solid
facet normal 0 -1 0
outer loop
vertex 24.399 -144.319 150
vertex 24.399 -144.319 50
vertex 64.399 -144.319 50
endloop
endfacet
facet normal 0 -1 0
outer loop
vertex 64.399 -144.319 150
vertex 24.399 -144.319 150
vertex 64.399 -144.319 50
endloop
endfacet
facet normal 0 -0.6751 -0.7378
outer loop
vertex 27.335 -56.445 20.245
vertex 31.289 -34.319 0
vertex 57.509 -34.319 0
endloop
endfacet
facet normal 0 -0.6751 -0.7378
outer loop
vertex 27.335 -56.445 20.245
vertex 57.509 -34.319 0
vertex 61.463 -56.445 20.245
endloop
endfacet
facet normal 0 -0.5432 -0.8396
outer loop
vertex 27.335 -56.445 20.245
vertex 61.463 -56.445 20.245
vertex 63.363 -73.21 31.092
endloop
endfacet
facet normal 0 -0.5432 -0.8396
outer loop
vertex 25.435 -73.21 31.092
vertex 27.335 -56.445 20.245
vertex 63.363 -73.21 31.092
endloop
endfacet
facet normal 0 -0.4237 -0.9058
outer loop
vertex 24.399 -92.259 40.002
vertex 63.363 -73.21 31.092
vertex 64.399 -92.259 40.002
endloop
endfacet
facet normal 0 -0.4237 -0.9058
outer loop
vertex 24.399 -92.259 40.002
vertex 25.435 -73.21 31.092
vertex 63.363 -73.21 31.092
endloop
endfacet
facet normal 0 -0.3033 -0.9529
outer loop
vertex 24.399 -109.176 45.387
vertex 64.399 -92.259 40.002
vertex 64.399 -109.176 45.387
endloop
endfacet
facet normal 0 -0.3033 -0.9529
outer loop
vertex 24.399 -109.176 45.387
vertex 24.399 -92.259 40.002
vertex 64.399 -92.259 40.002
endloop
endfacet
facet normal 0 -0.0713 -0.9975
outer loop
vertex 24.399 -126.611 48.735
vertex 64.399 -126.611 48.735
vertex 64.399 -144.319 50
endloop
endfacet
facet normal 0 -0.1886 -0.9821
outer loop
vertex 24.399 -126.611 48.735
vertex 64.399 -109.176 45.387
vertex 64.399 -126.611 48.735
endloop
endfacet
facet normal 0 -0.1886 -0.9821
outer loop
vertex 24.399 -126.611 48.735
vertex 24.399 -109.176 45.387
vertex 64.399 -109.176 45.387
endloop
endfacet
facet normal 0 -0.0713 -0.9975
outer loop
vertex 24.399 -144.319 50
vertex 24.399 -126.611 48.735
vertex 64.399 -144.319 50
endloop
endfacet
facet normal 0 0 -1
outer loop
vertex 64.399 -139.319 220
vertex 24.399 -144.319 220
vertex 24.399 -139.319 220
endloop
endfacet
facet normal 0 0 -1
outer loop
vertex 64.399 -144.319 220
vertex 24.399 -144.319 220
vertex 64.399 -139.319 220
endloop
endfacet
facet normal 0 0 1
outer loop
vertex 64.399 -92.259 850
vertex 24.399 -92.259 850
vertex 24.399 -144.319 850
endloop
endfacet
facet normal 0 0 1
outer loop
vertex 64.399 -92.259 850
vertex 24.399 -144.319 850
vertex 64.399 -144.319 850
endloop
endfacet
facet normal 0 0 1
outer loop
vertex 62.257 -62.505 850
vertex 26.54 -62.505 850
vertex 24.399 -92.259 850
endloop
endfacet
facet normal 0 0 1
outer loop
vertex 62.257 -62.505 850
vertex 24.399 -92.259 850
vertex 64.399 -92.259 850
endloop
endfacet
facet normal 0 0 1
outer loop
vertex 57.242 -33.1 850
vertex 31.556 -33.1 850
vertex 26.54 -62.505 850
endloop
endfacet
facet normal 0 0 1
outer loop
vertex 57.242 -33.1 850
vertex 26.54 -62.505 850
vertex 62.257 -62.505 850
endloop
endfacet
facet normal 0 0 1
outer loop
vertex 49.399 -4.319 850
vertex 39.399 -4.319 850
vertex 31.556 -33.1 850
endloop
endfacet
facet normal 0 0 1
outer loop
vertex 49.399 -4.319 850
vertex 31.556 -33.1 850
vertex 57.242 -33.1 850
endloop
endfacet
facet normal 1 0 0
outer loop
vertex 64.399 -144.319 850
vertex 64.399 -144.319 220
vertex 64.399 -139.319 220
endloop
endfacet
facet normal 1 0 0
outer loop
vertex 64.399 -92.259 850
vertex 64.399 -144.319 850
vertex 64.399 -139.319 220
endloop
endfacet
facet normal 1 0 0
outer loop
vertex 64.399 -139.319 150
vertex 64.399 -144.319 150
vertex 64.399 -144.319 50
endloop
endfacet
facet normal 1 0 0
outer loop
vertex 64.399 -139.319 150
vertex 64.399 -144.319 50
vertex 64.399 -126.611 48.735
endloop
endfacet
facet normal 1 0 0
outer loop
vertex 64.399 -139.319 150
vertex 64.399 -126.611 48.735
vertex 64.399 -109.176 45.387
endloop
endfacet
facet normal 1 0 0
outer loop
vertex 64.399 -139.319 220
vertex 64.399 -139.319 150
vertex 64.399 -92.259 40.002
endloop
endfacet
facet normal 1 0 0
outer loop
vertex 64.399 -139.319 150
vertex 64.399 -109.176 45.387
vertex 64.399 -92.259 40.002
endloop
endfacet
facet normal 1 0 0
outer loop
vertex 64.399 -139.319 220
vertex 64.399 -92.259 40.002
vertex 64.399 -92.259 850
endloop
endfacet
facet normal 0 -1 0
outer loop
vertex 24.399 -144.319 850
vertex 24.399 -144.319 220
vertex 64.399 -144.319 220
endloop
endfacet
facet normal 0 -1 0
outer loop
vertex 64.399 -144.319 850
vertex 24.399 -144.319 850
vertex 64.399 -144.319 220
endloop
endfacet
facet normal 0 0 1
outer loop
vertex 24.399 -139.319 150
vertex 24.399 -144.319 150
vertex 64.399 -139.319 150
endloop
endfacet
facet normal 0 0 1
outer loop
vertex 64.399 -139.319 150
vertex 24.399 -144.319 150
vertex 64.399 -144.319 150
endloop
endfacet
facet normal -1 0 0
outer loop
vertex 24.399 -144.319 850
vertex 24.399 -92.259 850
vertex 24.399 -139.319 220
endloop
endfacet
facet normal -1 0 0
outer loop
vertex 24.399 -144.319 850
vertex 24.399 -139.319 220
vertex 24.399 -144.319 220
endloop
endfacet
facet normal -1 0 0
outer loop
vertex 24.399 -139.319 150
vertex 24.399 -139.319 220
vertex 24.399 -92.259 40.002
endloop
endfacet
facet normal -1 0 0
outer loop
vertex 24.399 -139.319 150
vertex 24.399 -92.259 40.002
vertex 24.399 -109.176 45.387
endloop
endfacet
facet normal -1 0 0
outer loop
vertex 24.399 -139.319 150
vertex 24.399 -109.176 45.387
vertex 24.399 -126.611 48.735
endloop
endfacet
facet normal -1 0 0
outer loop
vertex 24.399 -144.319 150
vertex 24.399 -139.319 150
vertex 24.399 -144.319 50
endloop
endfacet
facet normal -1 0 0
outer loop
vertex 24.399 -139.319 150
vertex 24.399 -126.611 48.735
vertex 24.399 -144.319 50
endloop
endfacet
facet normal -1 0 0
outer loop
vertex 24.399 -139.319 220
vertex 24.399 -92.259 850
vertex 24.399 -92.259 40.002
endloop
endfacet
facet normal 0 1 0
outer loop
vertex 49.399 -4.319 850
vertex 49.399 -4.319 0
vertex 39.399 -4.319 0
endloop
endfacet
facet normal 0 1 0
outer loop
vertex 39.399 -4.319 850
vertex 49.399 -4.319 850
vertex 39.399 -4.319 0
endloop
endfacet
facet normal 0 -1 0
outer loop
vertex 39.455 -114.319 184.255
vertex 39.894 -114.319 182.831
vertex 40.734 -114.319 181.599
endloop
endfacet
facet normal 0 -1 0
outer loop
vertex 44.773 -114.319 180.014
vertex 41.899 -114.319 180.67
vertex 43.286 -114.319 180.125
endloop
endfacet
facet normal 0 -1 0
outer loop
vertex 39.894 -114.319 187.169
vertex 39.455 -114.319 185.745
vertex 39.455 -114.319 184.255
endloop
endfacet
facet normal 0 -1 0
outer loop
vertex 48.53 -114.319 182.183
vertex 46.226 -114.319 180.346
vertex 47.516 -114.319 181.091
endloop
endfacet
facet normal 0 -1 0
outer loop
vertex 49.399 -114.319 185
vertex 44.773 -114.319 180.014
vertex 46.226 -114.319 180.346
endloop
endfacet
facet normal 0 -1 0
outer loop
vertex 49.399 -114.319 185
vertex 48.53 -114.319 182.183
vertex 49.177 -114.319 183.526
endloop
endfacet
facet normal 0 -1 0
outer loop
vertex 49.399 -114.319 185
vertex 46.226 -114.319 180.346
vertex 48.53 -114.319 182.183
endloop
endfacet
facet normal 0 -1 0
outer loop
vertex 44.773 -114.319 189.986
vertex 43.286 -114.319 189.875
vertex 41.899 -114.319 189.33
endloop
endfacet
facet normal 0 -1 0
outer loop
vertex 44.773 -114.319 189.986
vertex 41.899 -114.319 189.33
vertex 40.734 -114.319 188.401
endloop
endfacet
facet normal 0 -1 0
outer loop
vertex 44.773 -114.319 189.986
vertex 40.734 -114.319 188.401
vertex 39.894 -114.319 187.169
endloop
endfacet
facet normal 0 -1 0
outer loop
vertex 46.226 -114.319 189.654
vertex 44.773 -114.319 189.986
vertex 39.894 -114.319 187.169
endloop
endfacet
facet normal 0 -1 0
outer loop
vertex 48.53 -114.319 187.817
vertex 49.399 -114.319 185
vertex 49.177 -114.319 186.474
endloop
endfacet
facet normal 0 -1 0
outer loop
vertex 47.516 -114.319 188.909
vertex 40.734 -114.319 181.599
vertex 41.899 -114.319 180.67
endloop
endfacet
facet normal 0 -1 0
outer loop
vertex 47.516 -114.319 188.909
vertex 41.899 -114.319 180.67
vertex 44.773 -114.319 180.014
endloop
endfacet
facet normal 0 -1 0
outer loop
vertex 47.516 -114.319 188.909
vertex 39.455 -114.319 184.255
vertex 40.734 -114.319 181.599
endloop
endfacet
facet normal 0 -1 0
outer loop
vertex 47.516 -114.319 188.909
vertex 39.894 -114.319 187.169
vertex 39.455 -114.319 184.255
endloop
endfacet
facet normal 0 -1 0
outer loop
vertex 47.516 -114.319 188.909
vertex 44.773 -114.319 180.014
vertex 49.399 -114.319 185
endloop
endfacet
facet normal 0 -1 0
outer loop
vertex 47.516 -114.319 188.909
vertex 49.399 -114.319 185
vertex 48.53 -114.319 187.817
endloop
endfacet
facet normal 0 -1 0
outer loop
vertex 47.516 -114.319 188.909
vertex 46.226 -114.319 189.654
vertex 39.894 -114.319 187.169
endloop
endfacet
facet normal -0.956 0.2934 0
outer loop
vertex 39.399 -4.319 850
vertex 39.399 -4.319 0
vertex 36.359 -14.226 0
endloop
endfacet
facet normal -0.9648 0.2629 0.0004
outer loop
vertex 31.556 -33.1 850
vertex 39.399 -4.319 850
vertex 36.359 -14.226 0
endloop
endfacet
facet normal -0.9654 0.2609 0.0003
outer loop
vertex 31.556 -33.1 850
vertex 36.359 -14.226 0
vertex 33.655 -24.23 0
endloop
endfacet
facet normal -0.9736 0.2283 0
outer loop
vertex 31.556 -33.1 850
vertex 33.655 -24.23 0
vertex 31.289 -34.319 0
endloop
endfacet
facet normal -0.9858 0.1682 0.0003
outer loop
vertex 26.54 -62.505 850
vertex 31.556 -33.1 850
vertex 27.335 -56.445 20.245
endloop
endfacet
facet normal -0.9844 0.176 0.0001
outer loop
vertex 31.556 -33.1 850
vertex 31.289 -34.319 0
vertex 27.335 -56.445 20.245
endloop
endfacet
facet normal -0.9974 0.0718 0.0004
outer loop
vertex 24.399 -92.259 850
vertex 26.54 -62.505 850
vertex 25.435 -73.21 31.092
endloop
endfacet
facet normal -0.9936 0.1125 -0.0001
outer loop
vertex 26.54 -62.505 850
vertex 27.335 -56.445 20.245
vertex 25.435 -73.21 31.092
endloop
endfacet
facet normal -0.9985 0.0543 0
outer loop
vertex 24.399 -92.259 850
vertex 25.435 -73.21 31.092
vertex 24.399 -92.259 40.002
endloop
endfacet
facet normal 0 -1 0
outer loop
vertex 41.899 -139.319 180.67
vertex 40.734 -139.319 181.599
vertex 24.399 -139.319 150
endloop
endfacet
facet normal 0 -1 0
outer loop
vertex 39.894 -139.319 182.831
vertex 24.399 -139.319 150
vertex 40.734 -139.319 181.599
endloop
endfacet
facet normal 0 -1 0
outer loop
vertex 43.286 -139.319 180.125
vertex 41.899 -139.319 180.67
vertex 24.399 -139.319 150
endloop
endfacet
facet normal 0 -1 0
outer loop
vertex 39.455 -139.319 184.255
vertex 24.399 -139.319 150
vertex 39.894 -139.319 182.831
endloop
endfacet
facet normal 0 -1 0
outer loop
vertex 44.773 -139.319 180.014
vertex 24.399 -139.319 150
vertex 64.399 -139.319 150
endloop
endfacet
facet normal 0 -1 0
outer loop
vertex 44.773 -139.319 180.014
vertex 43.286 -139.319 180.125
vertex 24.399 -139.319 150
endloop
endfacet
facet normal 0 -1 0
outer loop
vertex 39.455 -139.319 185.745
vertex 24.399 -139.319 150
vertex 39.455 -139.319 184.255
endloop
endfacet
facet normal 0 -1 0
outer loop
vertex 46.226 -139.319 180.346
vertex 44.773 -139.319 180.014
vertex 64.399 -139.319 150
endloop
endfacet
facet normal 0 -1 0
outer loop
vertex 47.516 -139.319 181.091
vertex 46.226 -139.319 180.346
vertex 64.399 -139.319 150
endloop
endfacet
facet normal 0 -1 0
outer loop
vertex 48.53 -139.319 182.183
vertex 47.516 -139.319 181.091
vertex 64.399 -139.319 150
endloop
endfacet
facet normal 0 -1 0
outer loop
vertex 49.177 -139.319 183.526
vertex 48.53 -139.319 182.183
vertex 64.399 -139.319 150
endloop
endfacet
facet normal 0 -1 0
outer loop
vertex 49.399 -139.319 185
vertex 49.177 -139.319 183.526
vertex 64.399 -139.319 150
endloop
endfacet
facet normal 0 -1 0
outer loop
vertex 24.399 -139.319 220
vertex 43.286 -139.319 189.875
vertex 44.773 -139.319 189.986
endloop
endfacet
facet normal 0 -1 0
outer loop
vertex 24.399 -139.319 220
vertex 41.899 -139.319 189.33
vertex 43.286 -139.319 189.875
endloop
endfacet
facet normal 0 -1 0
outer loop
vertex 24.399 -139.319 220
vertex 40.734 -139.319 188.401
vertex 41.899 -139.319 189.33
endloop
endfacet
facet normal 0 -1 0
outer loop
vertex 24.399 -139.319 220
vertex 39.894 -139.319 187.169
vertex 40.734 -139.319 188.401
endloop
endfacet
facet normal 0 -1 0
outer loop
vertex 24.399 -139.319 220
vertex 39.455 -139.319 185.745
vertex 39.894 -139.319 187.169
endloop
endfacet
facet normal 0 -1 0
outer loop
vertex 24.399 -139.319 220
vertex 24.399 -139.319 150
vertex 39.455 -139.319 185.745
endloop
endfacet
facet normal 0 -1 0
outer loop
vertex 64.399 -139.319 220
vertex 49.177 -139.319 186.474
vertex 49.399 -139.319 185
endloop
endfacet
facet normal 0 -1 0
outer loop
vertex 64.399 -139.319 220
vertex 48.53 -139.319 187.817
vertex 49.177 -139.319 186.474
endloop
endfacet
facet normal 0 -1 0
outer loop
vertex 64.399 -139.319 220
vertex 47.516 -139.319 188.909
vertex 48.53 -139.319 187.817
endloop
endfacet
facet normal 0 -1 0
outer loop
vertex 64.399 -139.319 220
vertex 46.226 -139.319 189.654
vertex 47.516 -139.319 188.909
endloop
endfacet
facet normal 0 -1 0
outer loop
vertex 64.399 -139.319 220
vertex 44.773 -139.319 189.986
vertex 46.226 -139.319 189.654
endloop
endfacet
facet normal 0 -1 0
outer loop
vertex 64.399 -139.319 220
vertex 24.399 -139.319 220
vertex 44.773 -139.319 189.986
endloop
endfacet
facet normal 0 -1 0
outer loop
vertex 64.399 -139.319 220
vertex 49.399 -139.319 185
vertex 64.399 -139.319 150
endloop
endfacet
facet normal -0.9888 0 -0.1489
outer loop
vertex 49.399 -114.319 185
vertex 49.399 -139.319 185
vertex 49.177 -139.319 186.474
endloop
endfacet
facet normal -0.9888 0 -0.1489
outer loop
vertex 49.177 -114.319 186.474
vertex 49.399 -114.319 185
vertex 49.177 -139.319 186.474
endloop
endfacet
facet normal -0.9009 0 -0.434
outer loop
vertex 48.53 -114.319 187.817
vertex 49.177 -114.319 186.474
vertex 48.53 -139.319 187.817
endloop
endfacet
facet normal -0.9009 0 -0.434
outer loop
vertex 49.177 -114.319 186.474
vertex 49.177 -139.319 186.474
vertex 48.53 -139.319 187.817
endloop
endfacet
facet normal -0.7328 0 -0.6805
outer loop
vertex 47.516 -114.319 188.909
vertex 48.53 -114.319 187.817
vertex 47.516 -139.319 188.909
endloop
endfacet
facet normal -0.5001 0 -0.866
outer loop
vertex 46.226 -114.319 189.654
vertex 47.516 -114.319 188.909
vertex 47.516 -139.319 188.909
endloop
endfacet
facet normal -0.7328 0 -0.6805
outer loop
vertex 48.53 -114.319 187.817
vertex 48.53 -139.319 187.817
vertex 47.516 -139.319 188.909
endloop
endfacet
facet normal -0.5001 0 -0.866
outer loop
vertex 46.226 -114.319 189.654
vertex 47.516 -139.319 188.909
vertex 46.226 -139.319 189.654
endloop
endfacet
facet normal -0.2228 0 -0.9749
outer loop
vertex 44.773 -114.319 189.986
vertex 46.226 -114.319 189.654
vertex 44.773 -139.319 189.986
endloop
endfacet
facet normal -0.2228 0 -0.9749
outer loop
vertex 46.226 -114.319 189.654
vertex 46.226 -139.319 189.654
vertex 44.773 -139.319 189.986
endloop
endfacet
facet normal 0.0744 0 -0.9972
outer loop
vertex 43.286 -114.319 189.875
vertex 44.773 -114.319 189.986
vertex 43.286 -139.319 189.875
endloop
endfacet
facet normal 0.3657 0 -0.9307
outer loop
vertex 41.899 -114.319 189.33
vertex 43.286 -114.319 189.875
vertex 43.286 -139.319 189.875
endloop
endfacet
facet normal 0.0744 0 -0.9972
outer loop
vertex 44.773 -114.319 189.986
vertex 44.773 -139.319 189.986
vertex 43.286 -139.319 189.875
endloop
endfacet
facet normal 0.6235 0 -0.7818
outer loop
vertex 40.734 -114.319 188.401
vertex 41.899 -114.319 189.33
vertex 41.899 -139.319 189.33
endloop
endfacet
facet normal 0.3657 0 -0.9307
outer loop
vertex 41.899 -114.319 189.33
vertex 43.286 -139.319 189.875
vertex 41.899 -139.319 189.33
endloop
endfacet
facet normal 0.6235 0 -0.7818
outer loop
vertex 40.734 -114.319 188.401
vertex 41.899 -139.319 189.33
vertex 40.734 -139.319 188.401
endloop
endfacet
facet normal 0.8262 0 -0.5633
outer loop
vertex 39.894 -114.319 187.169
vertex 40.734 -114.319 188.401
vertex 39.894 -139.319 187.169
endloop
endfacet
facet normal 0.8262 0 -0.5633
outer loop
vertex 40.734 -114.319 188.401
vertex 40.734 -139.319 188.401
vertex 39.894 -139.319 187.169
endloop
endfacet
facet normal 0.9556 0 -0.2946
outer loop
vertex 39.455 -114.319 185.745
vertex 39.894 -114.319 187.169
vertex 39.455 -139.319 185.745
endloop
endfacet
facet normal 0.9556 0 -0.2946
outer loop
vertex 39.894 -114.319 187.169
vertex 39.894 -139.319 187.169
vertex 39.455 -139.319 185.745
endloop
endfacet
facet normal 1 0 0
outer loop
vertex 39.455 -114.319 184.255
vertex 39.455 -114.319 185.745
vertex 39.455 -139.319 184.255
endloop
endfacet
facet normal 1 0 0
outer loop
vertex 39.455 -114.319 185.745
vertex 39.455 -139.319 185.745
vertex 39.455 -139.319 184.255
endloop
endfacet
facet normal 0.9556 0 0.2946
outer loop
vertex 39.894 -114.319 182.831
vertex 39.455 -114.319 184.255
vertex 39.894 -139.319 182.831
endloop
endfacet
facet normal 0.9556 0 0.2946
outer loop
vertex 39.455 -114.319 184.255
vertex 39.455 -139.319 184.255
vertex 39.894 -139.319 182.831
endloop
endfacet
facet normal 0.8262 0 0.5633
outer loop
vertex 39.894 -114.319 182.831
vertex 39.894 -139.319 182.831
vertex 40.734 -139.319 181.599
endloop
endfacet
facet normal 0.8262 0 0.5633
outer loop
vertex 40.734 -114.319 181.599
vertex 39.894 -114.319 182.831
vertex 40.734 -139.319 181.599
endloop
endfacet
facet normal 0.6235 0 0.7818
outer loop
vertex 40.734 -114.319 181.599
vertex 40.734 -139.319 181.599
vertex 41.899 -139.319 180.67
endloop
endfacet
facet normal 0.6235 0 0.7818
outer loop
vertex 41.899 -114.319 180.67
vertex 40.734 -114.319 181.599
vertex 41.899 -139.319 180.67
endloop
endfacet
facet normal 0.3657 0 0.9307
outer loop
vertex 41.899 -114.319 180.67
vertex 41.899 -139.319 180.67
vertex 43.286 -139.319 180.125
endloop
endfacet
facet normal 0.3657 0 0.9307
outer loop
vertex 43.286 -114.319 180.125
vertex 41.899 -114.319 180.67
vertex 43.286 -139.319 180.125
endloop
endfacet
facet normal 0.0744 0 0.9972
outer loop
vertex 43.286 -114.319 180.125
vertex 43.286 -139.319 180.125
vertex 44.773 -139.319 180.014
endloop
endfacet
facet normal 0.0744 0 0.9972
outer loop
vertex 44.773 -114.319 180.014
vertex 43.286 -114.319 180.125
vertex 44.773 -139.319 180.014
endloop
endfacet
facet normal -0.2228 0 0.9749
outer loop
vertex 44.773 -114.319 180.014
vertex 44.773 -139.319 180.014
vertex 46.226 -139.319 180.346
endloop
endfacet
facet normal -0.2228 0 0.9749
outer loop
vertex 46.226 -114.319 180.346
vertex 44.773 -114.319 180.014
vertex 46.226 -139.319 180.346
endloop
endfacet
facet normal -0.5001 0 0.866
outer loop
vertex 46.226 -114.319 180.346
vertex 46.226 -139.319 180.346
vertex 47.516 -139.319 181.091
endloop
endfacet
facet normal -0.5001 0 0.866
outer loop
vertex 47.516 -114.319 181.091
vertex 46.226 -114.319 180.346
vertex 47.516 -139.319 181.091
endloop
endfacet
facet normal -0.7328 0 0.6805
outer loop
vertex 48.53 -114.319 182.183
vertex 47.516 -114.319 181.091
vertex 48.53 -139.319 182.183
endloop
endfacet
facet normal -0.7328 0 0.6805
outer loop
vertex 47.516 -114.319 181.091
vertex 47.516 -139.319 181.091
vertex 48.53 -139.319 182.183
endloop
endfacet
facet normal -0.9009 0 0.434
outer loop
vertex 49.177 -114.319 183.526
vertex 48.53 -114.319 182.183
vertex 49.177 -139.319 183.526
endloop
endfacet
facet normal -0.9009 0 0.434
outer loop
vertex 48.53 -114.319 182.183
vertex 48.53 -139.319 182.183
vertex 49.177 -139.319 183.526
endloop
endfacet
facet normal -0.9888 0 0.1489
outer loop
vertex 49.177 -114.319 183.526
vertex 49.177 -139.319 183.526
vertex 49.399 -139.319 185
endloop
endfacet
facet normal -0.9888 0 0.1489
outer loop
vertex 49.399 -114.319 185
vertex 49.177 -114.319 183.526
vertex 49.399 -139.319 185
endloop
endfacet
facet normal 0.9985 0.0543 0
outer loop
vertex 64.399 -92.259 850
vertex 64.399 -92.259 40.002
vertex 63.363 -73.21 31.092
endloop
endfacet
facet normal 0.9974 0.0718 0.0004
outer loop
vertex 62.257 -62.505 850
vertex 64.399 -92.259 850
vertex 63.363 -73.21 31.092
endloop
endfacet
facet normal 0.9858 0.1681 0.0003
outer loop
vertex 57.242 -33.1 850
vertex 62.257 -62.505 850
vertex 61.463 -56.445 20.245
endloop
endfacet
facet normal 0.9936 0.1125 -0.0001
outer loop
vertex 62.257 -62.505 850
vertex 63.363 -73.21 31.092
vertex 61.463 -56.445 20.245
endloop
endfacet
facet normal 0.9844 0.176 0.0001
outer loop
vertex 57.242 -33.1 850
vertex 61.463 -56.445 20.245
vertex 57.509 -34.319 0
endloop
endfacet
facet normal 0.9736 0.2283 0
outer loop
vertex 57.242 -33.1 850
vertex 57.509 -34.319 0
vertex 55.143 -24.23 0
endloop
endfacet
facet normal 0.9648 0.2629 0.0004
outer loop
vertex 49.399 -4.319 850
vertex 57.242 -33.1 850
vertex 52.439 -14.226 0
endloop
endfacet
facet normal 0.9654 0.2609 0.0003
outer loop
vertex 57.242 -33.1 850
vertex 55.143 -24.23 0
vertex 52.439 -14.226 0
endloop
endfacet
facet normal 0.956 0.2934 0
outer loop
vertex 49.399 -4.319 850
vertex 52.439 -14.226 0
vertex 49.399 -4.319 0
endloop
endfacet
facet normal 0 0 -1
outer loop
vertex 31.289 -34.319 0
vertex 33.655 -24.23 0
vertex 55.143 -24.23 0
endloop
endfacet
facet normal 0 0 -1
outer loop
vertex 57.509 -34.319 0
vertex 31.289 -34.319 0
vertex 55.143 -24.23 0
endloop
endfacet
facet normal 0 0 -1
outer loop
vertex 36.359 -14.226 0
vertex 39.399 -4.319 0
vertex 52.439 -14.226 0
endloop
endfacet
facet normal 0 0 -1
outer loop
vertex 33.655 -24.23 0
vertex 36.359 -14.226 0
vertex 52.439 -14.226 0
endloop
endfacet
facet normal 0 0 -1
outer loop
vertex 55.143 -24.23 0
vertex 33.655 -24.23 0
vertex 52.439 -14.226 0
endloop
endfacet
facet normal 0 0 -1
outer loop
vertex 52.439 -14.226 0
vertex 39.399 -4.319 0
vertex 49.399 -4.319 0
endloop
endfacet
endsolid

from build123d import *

# Parameters (mm, degrees)
F1_DEPTH = 850
F2_W     = 40
F2_H     = 70
F3_DEPTH = 5
F4_R     = 5
F5_DEPTH = 25
F7_DEPTH = 150


with BuildPart() as f1:
    # F0 (on Top) → F1 (new body)
    with BuildSketch(Plane.XY):
        with BuildLine():
            Line((49.398924, -4.319251), (39.398924, -4.319251))
            ThreePointArc((39.398924, -4.319251), (28.691348, -47.741817), (24.398924, -92.258629))
            Line((24.398924, -92.258629), (24.398924, -106.582679))
            Line((24.398924, -106.582679), (24.398924, -144.319251))
            Line((24.398924, -144.319251), (64.398924, -144.319251))
            Line((64.398924, -144.319251), (64.398924, -106.582679))
            Line((64.398924, -106.582679), (64.398924, -92.258629))
            ThreePointArc((64.398924, -92.258629), (60.1065, -47.741817), (49.398924, -4.319251))
        make_face()
    extrude(amount=F1_DEPTH)

    # F2 (on face) → F3 (cut)
    with BuildSketch(Plane.XZ.offset(144.319251)):
        with Locations((44.398924, 185)):
            Rectangle(F2_W, F2_H)
    extrude(amount=-F3_DEPTH, mode=Mode.SUBTRACT)

    # F4 (on face) → F5 (cut)
    with BuildSketch(Plane.XZ.offset(139.319251)):
        with Locations((44.398924, 185)):
            Circle(F4_R)
    extrude(amount=-F5_DEPTH, mode=Mode.SUBTRACT)

    # F6 (on Right) → F7 (cut)
    with BuildSketch(Plane.YZ):
        with BuildLine():
            Line((-144.319251, 0), (-34.319251, 0))
            ThreePointArc((-34.319251, 0), (-84.06201, 36.565931), (-144.319251, 50))
            Line((-144.319251, 50), (-144.319251, 0))
        make_face()
    extrude(amount=F7_DEPTH, mode=Mode.SUBTRACT)


solid = f1.part
